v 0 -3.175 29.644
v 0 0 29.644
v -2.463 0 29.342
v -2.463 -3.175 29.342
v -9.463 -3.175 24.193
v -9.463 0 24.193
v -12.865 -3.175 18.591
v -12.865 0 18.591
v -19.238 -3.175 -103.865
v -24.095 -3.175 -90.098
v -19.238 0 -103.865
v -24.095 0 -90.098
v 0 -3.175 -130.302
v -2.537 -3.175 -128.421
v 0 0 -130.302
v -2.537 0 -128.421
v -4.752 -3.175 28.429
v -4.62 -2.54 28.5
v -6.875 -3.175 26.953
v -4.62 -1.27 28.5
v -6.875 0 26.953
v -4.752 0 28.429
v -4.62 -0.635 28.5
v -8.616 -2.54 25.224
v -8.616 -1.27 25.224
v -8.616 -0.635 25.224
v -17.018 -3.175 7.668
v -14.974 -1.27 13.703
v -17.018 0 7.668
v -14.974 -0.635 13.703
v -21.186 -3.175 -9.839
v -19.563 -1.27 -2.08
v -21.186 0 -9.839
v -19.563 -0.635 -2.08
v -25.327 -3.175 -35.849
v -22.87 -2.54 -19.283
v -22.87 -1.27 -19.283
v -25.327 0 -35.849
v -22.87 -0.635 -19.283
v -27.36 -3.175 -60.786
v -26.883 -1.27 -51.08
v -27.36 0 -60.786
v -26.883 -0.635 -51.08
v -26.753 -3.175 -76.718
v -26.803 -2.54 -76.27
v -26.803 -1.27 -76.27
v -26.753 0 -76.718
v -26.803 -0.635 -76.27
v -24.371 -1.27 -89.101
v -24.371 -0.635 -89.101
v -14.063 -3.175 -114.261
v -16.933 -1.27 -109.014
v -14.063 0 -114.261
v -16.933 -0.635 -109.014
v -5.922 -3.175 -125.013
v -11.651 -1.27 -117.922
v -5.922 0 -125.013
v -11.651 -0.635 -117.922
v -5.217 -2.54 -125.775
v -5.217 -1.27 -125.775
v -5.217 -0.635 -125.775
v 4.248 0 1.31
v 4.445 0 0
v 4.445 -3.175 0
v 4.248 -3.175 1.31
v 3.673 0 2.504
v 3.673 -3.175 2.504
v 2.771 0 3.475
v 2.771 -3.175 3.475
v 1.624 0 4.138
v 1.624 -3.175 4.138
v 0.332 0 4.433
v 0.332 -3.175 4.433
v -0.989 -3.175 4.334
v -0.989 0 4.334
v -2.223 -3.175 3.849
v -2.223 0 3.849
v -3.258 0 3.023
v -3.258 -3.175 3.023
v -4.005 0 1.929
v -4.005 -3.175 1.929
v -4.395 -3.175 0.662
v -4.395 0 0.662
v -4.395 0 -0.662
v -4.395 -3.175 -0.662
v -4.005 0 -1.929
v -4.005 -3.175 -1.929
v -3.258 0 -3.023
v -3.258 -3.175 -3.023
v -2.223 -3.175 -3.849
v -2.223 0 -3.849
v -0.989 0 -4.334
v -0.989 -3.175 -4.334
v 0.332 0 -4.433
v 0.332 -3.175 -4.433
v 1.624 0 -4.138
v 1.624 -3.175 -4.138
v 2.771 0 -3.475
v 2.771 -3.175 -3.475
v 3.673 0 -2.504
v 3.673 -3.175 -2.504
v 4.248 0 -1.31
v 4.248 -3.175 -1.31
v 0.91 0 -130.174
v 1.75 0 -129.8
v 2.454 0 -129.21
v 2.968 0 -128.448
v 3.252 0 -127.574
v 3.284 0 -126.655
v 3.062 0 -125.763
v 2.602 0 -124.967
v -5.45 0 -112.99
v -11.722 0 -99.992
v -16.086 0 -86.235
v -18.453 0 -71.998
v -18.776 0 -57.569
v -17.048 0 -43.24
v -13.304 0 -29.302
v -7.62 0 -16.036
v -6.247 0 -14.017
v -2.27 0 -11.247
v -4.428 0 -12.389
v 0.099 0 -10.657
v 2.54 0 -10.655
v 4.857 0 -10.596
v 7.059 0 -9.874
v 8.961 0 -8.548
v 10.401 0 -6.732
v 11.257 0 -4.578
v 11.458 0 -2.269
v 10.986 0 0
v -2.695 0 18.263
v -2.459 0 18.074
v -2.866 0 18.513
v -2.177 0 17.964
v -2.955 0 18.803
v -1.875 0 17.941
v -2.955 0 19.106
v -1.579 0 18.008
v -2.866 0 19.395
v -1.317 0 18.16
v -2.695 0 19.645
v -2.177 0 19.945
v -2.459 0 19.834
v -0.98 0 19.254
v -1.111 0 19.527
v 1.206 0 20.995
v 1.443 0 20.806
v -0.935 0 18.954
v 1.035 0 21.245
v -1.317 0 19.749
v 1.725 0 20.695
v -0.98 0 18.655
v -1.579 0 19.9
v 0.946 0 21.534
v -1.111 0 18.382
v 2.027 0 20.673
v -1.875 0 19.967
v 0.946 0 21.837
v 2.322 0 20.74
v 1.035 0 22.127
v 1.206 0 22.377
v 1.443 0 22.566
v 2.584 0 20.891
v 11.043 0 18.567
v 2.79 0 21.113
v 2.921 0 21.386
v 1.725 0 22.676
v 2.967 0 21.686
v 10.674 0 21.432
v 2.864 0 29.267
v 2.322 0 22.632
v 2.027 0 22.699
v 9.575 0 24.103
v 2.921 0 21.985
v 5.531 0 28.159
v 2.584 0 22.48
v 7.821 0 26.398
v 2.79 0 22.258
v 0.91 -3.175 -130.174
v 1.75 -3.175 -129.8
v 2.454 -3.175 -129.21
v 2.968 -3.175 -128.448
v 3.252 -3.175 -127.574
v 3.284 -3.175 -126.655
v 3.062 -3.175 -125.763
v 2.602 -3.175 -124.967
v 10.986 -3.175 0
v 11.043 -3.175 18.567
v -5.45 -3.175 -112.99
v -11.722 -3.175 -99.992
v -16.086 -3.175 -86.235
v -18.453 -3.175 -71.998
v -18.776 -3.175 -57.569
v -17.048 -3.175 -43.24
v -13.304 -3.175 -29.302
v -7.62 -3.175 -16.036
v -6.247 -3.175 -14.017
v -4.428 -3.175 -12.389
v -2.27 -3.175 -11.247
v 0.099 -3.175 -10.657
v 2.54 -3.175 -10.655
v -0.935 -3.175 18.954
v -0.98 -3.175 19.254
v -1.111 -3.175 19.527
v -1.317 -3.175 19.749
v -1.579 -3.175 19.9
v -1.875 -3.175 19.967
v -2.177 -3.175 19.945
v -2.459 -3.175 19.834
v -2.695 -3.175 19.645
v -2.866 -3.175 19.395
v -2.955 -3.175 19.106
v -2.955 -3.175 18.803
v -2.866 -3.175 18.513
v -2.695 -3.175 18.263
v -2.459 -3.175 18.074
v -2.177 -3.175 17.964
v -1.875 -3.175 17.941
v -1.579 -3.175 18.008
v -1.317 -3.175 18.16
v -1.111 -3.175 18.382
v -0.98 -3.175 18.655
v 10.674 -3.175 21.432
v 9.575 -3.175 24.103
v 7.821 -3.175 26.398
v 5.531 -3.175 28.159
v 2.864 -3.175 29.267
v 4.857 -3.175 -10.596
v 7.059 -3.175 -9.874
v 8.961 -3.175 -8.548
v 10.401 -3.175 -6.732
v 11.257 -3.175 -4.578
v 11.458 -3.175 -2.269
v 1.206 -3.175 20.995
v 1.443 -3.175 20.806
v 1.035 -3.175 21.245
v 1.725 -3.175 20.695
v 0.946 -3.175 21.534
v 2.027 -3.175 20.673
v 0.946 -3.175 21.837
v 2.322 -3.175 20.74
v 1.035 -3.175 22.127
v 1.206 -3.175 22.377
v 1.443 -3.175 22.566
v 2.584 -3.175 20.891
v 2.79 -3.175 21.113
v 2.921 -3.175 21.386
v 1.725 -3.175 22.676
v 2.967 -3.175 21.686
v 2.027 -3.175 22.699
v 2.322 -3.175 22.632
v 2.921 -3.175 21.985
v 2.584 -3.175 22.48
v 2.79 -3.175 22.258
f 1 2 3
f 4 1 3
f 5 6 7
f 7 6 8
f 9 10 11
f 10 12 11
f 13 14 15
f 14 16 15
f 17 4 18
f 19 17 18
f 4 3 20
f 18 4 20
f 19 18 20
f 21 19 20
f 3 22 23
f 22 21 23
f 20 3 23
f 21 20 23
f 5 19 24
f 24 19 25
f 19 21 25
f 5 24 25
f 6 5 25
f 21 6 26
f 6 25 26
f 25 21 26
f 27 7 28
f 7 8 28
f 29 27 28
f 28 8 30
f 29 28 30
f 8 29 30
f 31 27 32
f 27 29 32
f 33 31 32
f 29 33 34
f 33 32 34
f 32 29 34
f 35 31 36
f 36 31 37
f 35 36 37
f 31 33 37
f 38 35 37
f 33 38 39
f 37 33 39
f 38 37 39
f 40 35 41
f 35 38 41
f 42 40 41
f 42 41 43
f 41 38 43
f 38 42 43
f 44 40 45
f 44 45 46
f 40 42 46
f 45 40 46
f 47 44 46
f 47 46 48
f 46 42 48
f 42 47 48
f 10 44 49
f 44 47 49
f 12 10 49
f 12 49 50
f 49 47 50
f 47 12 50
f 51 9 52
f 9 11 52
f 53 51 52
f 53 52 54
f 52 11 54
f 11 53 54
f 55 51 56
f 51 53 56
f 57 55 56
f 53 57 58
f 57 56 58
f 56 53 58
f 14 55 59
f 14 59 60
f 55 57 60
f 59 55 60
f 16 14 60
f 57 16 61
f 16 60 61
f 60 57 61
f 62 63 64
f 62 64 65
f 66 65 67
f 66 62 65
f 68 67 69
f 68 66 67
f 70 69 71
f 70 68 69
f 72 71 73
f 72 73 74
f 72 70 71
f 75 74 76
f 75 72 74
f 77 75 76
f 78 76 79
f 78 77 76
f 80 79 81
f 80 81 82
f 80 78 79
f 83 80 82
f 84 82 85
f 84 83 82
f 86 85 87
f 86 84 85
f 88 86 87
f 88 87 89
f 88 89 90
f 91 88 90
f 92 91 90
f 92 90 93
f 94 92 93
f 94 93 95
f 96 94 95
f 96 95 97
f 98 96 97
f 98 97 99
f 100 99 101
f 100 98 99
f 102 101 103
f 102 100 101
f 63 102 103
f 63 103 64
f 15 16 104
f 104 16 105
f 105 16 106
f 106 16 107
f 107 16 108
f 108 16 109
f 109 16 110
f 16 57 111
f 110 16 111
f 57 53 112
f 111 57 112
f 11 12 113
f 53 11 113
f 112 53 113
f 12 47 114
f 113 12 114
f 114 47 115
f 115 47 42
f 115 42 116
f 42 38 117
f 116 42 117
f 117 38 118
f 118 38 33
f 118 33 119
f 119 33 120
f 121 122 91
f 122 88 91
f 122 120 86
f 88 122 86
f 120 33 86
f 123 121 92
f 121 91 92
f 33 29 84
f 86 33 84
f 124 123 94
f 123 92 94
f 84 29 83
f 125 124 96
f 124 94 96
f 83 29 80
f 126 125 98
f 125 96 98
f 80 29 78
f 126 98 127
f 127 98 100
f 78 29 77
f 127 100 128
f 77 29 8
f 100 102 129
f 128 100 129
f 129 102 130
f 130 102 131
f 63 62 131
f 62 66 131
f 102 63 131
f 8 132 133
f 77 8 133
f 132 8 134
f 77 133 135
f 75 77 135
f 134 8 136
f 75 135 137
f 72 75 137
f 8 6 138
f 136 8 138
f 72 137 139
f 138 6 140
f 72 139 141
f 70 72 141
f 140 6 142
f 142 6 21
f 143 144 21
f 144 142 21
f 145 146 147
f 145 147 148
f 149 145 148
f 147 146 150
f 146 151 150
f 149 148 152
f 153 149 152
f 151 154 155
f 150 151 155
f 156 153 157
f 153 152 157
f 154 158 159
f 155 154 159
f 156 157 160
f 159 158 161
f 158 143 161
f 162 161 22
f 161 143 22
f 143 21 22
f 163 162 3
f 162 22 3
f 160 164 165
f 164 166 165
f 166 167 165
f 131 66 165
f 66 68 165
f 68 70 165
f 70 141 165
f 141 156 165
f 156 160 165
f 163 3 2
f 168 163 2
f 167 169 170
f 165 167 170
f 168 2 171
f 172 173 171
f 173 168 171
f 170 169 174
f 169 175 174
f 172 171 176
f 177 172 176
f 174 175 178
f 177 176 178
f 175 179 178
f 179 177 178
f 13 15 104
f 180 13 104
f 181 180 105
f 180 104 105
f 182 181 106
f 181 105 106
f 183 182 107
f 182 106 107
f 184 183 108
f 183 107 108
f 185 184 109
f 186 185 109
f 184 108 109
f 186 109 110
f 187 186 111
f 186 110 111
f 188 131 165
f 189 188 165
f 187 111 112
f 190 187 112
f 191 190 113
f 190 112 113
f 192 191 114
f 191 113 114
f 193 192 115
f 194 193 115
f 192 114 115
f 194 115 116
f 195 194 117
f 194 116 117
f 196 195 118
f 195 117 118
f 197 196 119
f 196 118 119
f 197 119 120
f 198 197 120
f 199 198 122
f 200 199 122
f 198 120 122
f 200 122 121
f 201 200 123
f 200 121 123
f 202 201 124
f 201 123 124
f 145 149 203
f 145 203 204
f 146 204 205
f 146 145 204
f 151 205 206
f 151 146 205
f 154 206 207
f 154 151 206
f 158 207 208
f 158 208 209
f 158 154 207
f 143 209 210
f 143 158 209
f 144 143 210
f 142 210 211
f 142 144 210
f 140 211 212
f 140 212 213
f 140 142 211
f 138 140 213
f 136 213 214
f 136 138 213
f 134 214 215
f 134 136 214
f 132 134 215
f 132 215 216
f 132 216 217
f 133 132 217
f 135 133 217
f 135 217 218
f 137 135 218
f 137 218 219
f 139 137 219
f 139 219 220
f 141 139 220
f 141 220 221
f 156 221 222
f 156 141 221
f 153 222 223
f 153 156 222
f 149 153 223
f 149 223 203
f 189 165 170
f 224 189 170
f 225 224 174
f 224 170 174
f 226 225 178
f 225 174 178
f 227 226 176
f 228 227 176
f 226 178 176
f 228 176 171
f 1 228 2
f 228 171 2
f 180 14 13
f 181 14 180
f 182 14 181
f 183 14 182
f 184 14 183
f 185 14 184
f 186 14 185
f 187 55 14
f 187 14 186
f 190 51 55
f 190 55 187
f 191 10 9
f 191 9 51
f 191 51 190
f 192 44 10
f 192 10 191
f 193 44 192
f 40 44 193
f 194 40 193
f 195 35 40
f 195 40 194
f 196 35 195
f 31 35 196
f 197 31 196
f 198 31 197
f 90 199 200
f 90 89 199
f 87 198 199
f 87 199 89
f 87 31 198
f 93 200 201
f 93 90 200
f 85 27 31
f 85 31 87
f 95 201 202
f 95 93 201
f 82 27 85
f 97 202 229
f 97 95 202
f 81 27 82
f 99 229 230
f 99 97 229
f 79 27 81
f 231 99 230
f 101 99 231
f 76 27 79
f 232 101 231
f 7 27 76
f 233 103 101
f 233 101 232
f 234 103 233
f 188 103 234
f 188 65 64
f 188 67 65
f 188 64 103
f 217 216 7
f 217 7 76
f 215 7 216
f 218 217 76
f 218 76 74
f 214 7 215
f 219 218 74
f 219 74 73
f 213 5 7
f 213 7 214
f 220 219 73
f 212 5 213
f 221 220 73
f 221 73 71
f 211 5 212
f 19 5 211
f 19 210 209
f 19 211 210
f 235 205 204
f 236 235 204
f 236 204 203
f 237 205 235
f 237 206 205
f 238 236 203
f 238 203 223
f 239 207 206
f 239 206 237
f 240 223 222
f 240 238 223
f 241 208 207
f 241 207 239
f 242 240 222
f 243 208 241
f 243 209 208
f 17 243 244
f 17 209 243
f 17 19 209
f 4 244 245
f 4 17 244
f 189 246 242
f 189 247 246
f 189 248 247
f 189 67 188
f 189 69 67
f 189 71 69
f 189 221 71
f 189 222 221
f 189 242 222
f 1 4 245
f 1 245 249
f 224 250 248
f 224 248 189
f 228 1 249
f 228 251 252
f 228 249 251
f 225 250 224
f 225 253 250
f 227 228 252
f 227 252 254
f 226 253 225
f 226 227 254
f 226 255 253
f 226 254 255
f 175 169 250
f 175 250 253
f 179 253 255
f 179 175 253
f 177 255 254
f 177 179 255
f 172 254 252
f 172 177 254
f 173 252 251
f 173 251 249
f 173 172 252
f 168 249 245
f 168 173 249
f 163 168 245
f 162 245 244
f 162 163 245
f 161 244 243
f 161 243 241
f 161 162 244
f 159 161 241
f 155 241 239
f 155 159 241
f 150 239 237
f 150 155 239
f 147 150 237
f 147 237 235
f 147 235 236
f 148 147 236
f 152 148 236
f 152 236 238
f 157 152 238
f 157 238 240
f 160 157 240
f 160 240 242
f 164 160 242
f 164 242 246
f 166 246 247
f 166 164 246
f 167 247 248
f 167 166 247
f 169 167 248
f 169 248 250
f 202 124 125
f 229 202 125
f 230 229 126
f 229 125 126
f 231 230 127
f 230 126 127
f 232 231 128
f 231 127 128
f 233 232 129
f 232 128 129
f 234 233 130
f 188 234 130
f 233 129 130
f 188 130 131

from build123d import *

# Parameters (mm, degrees)
F0_R     = 4.445
F0_R_2   = 1.016
F1_DEPTH = 3.175


with BuildPart() as f1:
    # F0 (on Front) → F1 (new body)
    with BuildSketch(Plane.XZ):
        with BuildLine():
            Line((10.9859360382, 0), (11.0431610233, 18.5670308747))
            ThreePointArc((11.0431610233, 18.5670308747), (7.8207553667, 26.3977550832), (0, 29.6442802009))
            add(Edge.make_bspline(
                [(0, 29.6442802009), (-13.2085497305, 29.7476304527), (-25.1583041159, -23.8181494401), (-29.4519353818, -74.4164457422), (-21.1754381718, -99.8457187554), (-13.6279014694, -117.1784798673), (-2.3025634412, -129.2099436442), (0, -130.302)],
                knots=[0, 0, 0, 0, 0.2581998199, 0.5237379093, 0.6974604026, 0.8551414365, 1, 1, 1, 1], degree=3))
            ThreePointArc((0, -130.302), (2.9677379768, -128.4476654658), (2.6022360876, -124.9673732894))
            ThreePointArc((2.6022360876, -124.9673732894), (-18.4526676867, -71.9977321023), (-7.62, -16.0357345395))
            ThreePointArc((-7.62, -16.0357345395), (-3.3837079244, -11.7521923839), (2.54, -10.6546549701))
            ThreePointArc((2.54, -10.6546549701), (9.74702858, -7.6927897832), (10.9859360382, 0))
        make_face()
        Circle(F0_R, mode=Mode.SUBTRACT)
        with Locations((-1.9506058055, 18.9541711109)):
            Circle(F0_R_2, mode=Mode.SUBTRACT)
        with Locations((1.9506058055, 21.6858288891)):
            Circle(F0_R_2, mode=Mode.SUBTRACT)
    extrude(amount=F1_DEPTH)


solid = f1.part
